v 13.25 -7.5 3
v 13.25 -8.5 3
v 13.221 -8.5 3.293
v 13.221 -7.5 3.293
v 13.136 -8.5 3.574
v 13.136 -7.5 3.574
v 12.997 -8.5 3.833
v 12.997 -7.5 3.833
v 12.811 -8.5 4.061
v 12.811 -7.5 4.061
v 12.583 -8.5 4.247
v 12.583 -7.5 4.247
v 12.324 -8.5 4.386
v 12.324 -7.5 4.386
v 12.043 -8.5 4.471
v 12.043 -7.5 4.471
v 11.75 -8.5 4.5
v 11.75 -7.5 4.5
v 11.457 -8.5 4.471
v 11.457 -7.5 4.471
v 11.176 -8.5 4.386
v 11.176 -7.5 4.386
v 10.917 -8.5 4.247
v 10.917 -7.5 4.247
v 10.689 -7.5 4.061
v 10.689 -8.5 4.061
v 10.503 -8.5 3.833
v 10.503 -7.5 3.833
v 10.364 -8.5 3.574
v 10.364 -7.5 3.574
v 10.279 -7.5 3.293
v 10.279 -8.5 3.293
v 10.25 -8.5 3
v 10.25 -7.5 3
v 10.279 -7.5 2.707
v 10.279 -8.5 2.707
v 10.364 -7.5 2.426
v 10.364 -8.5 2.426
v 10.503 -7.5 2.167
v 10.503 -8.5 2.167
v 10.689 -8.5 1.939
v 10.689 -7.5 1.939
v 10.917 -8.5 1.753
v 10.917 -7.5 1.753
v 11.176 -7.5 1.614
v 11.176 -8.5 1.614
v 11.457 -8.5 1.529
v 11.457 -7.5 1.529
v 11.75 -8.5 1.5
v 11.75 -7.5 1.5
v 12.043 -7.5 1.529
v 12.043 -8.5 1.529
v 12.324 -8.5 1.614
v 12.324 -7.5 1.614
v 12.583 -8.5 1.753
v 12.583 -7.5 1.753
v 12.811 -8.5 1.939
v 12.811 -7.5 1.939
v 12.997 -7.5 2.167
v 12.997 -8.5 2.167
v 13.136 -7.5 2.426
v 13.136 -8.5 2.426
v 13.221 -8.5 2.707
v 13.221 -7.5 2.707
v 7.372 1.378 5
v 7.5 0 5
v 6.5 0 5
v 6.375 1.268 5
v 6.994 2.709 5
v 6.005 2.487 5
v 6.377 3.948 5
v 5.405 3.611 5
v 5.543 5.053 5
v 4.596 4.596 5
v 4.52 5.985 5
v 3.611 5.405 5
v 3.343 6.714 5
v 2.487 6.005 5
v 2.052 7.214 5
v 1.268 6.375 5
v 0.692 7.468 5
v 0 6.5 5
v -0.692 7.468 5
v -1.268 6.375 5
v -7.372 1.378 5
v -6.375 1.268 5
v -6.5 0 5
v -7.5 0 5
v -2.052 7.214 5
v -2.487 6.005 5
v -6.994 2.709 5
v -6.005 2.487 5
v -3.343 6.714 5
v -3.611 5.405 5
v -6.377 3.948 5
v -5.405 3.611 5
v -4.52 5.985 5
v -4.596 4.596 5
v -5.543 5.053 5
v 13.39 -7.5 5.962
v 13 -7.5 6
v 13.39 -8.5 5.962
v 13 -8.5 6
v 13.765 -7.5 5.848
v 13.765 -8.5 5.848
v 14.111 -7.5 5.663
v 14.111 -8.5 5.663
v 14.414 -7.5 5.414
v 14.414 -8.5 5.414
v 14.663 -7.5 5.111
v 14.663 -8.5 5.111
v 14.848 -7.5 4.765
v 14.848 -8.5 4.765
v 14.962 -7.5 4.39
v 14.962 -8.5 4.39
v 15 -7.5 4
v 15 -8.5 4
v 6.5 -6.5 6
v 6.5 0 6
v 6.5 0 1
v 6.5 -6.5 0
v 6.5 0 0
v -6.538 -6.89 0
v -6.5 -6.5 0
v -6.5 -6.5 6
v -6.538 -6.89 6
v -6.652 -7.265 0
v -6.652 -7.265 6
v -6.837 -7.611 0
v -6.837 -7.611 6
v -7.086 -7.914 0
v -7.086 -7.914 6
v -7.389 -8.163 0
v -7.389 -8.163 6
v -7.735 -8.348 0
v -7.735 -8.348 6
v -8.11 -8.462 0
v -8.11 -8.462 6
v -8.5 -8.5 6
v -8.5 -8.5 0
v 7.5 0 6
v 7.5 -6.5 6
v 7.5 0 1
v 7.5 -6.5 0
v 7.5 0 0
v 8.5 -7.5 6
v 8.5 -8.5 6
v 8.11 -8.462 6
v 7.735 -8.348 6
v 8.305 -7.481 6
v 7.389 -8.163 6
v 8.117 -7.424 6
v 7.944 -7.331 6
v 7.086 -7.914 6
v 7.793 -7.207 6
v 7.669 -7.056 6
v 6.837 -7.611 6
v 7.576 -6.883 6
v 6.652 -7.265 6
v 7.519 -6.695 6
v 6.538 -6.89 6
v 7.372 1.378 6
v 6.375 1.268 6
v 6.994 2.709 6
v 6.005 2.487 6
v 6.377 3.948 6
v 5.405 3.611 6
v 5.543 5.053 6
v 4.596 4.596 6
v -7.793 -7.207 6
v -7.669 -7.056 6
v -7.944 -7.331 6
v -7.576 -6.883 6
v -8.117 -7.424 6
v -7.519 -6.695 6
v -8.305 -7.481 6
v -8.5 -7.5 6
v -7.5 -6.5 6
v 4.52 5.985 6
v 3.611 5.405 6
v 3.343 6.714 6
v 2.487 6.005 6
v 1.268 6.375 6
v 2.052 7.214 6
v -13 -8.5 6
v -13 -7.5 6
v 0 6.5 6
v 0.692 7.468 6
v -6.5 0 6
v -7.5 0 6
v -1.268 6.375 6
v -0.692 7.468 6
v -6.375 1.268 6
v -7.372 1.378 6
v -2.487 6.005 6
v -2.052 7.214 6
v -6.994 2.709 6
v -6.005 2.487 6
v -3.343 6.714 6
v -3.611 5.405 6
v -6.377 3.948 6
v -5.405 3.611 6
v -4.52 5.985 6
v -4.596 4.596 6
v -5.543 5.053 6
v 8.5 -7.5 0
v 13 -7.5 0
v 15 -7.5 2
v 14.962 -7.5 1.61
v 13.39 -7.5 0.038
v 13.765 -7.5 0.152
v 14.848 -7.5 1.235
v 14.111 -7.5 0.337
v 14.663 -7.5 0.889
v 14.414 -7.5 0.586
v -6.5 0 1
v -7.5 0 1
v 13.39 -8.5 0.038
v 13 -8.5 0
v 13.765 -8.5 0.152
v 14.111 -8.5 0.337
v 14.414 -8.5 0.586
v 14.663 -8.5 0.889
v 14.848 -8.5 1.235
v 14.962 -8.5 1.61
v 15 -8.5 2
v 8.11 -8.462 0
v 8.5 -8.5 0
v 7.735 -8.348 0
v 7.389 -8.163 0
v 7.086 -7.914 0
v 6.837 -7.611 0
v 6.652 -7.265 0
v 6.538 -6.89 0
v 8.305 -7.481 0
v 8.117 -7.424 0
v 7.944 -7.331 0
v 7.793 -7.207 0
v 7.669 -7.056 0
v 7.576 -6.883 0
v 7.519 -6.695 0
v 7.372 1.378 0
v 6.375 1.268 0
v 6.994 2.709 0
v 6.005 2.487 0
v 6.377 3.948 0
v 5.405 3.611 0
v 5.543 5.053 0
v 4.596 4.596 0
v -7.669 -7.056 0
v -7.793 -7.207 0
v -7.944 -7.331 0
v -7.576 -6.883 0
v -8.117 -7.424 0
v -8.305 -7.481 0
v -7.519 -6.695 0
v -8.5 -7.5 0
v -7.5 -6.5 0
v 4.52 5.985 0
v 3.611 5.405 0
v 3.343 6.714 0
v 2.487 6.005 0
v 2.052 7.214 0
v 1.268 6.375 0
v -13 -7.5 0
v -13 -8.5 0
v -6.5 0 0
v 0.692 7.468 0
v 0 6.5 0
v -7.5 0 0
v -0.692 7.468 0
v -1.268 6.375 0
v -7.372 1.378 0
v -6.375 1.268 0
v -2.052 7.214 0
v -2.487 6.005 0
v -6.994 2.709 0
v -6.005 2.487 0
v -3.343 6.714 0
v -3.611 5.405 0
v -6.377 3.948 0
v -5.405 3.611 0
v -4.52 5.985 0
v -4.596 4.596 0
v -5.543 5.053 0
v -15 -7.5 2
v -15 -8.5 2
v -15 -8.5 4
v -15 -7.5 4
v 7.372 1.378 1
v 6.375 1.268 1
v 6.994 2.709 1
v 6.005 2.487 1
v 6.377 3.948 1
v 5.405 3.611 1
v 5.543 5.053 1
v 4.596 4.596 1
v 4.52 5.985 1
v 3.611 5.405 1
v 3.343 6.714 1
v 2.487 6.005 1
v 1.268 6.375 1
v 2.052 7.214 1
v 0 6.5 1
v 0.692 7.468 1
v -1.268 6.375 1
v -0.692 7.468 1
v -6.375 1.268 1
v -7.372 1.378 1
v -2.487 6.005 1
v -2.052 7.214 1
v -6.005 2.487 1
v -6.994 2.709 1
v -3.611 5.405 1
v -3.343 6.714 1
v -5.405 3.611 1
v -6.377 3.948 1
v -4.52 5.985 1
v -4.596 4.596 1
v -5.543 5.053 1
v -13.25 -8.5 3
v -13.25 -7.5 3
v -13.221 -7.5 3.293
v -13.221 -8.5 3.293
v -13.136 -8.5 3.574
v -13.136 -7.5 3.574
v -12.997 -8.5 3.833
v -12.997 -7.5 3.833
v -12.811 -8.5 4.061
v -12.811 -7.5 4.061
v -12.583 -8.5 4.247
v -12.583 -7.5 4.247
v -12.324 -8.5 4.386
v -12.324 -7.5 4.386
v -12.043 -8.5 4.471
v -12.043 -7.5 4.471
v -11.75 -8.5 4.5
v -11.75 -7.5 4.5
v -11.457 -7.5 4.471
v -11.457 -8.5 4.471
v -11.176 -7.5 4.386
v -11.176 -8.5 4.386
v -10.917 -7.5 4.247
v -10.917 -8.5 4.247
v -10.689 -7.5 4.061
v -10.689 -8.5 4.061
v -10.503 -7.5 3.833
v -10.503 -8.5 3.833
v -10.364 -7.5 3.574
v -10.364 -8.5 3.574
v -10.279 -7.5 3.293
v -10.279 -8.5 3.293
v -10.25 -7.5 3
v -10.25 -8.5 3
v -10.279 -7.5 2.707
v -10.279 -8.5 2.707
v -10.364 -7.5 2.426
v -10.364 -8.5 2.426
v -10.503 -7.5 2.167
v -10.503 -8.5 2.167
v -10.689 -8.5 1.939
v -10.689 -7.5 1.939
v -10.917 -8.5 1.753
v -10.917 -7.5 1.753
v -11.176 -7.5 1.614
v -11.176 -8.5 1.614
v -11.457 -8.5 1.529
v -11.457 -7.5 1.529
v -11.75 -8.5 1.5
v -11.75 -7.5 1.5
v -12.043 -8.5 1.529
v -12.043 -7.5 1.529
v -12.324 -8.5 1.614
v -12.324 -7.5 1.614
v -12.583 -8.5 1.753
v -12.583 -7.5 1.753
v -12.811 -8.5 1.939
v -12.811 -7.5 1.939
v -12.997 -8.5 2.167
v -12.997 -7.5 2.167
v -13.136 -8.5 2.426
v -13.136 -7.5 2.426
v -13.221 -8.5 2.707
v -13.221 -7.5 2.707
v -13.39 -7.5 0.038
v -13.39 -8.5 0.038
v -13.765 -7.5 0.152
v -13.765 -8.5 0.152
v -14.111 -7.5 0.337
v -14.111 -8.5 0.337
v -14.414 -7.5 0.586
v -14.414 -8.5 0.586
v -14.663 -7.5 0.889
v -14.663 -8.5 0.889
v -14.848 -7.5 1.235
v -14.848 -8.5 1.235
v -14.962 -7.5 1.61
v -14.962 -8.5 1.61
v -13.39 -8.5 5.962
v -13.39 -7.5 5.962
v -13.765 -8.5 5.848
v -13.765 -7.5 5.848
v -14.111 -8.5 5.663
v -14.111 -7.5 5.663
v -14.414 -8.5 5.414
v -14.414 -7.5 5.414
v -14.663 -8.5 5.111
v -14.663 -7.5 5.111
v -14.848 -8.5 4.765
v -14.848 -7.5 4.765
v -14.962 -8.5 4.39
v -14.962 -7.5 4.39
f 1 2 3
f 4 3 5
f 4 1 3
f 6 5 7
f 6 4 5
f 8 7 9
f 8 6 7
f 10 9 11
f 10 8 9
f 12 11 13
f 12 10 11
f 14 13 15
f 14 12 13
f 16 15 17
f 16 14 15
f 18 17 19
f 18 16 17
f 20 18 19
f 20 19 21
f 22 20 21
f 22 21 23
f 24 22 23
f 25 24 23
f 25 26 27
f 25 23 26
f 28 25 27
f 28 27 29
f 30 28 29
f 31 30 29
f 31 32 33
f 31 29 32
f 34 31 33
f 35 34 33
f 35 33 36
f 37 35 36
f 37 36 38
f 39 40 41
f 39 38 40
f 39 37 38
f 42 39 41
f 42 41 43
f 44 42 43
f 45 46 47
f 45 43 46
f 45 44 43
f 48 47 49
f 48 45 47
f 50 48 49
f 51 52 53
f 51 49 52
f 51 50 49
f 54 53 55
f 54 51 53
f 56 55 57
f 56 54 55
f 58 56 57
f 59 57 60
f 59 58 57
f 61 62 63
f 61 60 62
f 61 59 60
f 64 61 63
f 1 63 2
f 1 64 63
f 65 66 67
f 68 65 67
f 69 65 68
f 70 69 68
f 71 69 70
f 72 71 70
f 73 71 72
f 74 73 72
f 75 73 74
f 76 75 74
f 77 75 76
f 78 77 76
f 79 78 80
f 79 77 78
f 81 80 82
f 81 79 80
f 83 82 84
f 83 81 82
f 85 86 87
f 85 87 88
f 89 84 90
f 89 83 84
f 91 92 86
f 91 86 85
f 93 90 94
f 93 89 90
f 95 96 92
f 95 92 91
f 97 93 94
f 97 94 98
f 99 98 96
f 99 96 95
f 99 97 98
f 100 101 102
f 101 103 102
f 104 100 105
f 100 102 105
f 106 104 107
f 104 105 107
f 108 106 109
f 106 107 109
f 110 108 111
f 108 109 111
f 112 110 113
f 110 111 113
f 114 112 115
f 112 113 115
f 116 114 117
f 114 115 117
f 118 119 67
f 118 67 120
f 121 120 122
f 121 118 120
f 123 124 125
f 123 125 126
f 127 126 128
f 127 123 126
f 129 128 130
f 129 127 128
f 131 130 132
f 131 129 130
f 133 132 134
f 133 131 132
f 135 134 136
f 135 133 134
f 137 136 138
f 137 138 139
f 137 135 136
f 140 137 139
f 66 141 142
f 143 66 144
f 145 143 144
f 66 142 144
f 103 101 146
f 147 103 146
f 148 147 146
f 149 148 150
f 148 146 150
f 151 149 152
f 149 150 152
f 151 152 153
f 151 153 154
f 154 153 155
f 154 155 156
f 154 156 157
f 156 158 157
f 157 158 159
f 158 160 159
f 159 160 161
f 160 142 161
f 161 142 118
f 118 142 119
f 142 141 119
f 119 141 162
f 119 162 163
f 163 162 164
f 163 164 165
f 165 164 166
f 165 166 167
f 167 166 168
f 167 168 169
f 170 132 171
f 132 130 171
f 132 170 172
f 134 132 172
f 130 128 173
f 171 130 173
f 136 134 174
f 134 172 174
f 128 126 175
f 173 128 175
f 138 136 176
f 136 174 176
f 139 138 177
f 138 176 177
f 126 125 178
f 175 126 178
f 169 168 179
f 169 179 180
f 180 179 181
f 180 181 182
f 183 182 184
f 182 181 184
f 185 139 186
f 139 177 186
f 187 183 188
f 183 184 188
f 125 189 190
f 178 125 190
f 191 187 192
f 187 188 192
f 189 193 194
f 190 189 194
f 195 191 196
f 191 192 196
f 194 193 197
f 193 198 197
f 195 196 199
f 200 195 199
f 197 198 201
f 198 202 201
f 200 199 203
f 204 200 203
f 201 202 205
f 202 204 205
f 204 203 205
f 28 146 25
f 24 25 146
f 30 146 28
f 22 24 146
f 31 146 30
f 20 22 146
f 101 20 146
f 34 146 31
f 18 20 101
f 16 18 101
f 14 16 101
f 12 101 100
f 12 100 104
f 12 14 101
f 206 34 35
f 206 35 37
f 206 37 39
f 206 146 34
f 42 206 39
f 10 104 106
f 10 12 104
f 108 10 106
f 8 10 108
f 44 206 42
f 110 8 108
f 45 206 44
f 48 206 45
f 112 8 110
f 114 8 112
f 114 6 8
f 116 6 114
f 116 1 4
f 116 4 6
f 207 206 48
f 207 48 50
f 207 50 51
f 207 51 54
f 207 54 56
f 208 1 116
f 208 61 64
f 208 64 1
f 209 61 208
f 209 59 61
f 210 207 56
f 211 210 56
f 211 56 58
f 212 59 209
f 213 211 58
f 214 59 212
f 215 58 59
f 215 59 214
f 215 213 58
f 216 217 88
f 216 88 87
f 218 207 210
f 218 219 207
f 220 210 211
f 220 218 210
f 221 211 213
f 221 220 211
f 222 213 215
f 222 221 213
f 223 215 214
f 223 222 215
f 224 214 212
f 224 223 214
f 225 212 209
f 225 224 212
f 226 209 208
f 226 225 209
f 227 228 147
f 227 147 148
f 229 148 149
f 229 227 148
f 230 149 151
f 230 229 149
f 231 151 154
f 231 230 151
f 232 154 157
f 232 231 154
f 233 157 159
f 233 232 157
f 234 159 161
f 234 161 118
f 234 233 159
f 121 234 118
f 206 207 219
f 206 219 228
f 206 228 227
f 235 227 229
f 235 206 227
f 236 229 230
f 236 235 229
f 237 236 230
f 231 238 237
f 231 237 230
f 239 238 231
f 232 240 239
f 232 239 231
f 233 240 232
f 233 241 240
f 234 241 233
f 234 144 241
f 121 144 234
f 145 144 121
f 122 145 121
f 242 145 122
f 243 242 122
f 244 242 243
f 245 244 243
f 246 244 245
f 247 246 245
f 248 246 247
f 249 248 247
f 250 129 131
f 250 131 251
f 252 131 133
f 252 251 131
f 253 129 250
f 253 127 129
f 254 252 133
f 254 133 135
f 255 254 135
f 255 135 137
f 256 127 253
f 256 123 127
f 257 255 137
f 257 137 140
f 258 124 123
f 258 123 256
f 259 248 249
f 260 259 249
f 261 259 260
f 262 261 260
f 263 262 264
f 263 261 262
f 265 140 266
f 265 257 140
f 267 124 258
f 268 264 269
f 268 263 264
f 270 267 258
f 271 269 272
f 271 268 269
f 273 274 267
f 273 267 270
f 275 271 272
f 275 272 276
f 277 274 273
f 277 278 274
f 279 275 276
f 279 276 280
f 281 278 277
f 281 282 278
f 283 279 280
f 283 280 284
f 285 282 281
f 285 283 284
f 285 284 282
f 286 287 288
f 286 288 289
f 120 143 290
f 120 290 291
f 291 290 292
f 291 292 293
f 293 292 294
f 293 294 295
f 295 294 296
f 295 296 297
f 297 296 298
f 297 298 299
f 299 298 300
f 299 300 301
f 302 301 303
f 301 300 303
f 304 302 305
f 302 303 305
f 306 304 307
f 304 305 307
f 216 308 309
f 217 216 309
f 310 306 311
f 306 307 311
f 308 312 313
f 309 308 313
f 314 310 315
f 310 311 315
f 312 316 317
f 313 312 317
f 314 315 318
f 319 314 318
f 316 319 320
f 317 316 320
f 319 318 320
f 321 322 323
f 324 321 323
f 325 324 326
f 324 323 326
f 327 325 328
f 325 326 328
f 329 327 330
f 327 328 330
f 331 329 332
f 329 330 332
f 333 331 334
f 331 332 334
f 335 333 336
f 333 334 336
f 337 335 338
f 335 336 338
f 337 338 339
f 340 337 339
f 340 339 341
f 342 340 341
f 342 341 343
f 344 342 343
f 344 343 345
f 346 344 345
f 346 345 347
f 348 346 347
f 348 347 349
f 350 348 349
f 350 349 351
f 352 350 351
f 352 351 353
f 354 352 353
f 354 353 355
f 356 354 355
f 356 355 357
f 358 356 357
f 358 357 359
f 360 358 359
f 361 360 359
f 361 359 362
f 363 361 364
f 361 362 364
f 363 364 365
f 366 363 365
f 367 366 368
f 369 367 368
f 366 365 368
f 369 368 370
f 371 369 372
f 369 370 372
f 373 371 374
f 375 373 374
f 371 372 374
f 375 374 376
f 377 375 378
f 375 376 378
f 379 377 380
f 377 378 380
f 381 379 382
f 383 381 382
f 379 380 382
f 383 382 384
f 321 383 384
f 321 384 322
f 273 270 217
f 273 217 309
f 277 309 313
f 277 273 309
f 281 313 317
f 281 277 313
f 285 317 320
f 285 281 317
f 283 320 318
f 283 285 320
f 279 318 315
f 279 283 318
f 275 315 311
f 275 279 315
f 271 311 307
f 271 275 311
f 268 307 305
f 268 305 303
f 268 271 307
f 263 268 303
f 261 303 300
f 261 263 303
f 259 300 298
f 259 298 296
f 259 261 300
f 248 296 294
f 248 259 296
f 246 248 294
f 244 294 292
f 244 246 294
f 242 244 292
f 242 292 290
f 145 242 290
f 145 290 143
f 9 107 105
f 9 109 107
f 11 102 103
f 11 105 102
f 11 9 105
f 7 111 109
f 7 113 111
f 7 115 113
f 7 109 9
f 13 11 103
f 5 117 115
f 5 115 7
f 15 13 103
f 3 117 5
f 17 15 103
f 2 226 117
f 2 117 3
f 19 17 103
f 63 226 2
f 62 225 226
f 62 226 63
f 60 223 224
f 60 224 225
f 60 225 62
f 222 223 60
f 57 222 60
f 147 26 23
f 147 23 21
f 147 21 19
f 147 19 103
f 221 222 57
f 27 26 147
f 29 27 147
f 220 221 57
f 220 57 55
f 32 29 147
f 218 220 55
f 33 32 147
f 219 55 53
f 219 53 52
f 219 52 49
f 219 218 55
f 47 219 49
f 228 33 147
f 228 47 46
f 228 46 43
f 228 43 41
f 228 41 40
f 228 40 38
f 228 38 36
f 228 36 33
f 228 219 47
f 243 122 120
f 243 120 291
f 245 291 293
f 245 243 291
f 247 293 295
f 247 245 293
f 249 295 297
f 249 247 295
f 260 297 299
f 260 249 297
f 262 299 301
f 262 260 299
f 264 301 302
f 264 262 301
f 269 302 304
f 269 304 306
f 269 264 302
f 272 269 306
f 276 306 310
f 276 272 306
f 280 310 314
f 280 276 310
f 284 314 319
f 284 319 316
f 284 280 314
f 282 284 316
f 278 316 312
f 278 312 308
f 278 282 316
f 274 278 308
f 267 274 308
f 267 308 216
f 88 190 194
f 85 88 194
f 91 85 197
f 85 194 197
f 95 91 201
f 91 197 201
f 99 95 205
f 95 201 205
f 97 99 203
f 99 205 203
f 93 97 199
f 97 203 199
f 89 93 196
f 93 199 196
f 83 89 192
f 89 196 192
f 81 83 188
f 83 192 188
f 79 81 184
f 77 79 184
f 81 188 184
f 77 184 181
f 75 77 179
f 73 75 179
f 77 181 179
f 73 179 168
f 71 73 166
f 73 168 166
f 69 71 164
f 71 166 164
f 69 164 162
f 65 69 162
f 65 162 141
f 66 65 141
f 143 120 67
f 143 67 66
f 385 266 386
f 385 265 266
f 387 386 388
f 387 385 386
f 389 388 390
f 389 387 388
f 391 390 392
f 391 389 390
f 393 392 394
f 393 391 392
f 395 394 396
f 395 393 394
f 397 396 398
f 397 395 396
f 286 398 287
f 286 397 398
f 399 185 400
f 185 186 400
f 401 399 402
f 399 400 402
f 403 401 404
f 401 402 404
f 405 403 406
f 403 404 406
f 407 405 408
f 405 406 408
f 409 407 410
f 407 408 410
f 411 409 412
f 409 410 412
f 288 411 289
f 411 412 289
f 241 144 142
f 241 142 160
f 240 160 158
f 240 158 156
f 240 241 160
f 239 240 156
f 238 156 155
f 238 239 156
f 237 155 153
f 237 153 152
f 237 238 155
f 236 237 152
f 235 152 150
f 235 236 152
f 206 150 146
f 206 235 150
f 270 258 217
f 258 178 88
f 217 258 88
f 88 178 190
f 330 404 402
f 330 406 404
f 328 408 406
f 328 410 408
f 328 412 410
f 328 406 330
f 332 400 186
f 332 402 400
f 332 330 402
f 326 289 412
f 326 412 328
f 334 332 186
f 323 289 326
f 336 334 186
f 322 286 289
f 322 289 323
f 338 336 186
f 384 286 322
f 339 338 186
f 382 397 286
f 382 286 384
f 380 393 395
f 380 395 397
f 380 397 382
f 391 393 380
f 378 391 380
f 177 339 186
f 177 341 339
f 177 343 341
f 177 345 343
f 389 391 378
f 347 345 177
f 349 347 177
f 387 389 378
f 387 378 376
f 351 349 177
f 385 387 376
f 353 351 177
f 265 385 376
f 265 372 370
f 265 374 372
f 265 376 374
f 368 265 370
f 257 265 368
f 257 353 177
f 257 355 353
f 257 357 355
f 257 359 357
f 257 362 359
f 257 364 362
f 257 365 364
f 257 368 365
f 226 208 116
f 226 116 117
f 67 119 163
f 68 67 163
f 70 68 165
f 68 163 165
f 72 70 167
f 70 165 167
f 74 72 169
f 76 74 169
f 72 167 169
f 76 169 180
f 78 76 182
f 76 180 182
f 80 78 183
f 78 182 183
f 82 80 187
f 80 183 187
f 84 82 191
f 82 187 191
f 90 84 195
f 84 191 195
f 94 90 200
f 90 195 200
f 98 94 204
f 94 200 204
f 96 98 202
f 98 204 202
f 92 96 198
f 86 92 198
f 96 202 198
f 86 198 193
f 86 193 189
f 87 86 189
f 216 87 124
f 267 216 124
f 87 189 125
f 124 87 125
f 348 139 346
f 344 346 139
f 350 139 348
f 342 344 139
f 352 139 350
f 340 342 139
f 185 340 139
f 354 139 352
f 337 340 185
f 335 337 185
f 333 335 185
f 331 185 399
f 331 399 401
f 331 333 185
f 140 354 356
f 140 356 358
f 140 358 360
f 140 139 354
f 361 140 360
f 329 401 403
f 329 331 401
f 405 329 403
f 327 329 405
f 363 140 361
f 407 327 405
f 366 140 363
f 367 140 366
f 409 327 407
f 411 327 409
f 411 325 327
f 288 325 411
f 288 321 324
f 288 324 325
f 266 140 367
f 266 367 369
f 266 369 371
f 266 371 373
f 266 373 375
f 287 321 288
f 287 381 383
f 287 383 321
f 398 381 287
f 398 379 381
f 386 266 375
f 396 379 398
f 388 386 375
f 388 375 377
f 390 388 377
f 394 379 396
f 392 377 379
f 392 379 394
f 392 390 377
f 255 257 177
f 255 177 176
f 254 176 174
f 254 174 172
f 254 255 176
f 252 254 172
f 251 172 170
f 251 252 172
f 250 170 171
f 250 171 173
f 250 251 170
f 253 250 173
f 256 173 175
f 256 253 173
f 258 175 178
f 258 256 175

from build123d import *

# Parameters (mm, degrees)
BOSS_EXTRUDE2_DEPTH = 1
BOSS_EXTRUDE3_DEPTH = 6
SKETCH3_R           = 1.5
CUT_EXTRUDE1_DEPTH  = 6
FILLET1_R           = 2
SKETCH4_W           = 1
SKETCH4_H           = 4
BOSS_EXTRUDE4_DEPTH = 6.5


with BuildPart() as part:
    # Sketch1 → Boss-Extrude2 (new body)
    with BuildSketch(Plane.XY):
        with BuildLine():
            Line((7.5, 0), (7.5, -6.5))
            Line((7.5, -6.5), (6.5, -6.5))
            Line((6.5, -6.5), (6.5, 0))
            ThreePointArc((6.5, 0), (0, 6.5), (-6.5, 0))
            Line((-6.5, 0), (-6.5, -6.5))
            Line((-6.5, -6.5), (-7.5, -6.5))
            Line((-7.5, -6.5), (-7.5, 0))
            ThreePointArc((-7.5, 0), (0, 7.5), (7.5, 0))
        make_face()
    boss_extrude2 = extrude(amount=BOSS_EXTRUDE2_DEPTH)

    # Sketch1<4> → Boss-Extrude3 (add)
    with BuildSketch(Plane.XY):
        with BuildLine():
            Line((-7.5, -6.5), (-6.5, -6.5))
            ThreePointArc((-6.5, -6.5), (-7.085786438, -7.914213562), (-8.5, -8.5))
            Line((-8.5, -8.5), (-15, -8.5))
            Line((-15, -8.5), (-15, -7.5))
            Line((-15, -7.5), (-8.5, -7.5))
            ThreePointArc((-8.5, -7.5), (-7.792893219, -7.207106781), (-7.5, -6.5))
        make_face()
        with BuildLine():
            Line((6.5, -6.5), (7.5, -6.5))
            ThreePointArc((7.5, -6.5), (7.792893219, -7.207106781), (8.5, -7.5))
            Line((8.5, -7.5), (15, -7.5))
            Line((15, -7.5), (15, -8.5))
            Line((15, -8.5), (8.5, -8.5))
            ThreePointArc((8.5, -8.5), (7.085786438, -7.914213562), (6.5, -6.5))
        make_face()
    extrude(amount=BOSS_EXTRUDE3_DEPTH)

    # Mirror1: Boss-Extrude2 across plane
    add(boss_extrude2.mirror(Plane.XY.offset(3)))

    # Sketch3 → Cut-Extrude1 (cut)
    with BuildSketch(Plane(origin=(0, -7.5, 0), x_dir=(1, 0, 0), z_dir=(0, 1, 0))):
        with Locations(Location((-11.75, -3, 0), (0, 0, 180))):
            Circle(SKETCH3_R)
    cut_extrude1 = extrude(amount=-CUT_EXTRUDE1_DEPTH, mode=Mode.SUBTRACT)

    # Mirror2: Cut-Extrude1 across plane
    add(cut_extrude1.mirror(Plane.ZY), mode=Mode.SUBTRACT)

    # Fillet1
    fillet1_edges = [part.edges().sort_by_distance(p)[0] for p in [
        (-15, -8, 0),
        (-15, -8, 6),
        (15, -8, 6),
        (15, -8, 0),
    ]]
    fillet(fillet1_edges, radius=FILLET1_R)

    # Sketch4 → Boss-Extrude4 (add)
    with BuildSketch(Plane(origin=(0, -6.5, 0), x_dir=(1, 0, 0), z_dir=(0, 1, 0))):
        with Locations((7, -3)):
            Rectangle(SKETCH4_W, SKETCH4_H)
        with Locations((-7, -3)):
            Rectangle(SKETCH4_W, SKETCH4_H)
    extrude(amount=BOSS_EXTRUDE4_DEPTH)


solid = part.part
